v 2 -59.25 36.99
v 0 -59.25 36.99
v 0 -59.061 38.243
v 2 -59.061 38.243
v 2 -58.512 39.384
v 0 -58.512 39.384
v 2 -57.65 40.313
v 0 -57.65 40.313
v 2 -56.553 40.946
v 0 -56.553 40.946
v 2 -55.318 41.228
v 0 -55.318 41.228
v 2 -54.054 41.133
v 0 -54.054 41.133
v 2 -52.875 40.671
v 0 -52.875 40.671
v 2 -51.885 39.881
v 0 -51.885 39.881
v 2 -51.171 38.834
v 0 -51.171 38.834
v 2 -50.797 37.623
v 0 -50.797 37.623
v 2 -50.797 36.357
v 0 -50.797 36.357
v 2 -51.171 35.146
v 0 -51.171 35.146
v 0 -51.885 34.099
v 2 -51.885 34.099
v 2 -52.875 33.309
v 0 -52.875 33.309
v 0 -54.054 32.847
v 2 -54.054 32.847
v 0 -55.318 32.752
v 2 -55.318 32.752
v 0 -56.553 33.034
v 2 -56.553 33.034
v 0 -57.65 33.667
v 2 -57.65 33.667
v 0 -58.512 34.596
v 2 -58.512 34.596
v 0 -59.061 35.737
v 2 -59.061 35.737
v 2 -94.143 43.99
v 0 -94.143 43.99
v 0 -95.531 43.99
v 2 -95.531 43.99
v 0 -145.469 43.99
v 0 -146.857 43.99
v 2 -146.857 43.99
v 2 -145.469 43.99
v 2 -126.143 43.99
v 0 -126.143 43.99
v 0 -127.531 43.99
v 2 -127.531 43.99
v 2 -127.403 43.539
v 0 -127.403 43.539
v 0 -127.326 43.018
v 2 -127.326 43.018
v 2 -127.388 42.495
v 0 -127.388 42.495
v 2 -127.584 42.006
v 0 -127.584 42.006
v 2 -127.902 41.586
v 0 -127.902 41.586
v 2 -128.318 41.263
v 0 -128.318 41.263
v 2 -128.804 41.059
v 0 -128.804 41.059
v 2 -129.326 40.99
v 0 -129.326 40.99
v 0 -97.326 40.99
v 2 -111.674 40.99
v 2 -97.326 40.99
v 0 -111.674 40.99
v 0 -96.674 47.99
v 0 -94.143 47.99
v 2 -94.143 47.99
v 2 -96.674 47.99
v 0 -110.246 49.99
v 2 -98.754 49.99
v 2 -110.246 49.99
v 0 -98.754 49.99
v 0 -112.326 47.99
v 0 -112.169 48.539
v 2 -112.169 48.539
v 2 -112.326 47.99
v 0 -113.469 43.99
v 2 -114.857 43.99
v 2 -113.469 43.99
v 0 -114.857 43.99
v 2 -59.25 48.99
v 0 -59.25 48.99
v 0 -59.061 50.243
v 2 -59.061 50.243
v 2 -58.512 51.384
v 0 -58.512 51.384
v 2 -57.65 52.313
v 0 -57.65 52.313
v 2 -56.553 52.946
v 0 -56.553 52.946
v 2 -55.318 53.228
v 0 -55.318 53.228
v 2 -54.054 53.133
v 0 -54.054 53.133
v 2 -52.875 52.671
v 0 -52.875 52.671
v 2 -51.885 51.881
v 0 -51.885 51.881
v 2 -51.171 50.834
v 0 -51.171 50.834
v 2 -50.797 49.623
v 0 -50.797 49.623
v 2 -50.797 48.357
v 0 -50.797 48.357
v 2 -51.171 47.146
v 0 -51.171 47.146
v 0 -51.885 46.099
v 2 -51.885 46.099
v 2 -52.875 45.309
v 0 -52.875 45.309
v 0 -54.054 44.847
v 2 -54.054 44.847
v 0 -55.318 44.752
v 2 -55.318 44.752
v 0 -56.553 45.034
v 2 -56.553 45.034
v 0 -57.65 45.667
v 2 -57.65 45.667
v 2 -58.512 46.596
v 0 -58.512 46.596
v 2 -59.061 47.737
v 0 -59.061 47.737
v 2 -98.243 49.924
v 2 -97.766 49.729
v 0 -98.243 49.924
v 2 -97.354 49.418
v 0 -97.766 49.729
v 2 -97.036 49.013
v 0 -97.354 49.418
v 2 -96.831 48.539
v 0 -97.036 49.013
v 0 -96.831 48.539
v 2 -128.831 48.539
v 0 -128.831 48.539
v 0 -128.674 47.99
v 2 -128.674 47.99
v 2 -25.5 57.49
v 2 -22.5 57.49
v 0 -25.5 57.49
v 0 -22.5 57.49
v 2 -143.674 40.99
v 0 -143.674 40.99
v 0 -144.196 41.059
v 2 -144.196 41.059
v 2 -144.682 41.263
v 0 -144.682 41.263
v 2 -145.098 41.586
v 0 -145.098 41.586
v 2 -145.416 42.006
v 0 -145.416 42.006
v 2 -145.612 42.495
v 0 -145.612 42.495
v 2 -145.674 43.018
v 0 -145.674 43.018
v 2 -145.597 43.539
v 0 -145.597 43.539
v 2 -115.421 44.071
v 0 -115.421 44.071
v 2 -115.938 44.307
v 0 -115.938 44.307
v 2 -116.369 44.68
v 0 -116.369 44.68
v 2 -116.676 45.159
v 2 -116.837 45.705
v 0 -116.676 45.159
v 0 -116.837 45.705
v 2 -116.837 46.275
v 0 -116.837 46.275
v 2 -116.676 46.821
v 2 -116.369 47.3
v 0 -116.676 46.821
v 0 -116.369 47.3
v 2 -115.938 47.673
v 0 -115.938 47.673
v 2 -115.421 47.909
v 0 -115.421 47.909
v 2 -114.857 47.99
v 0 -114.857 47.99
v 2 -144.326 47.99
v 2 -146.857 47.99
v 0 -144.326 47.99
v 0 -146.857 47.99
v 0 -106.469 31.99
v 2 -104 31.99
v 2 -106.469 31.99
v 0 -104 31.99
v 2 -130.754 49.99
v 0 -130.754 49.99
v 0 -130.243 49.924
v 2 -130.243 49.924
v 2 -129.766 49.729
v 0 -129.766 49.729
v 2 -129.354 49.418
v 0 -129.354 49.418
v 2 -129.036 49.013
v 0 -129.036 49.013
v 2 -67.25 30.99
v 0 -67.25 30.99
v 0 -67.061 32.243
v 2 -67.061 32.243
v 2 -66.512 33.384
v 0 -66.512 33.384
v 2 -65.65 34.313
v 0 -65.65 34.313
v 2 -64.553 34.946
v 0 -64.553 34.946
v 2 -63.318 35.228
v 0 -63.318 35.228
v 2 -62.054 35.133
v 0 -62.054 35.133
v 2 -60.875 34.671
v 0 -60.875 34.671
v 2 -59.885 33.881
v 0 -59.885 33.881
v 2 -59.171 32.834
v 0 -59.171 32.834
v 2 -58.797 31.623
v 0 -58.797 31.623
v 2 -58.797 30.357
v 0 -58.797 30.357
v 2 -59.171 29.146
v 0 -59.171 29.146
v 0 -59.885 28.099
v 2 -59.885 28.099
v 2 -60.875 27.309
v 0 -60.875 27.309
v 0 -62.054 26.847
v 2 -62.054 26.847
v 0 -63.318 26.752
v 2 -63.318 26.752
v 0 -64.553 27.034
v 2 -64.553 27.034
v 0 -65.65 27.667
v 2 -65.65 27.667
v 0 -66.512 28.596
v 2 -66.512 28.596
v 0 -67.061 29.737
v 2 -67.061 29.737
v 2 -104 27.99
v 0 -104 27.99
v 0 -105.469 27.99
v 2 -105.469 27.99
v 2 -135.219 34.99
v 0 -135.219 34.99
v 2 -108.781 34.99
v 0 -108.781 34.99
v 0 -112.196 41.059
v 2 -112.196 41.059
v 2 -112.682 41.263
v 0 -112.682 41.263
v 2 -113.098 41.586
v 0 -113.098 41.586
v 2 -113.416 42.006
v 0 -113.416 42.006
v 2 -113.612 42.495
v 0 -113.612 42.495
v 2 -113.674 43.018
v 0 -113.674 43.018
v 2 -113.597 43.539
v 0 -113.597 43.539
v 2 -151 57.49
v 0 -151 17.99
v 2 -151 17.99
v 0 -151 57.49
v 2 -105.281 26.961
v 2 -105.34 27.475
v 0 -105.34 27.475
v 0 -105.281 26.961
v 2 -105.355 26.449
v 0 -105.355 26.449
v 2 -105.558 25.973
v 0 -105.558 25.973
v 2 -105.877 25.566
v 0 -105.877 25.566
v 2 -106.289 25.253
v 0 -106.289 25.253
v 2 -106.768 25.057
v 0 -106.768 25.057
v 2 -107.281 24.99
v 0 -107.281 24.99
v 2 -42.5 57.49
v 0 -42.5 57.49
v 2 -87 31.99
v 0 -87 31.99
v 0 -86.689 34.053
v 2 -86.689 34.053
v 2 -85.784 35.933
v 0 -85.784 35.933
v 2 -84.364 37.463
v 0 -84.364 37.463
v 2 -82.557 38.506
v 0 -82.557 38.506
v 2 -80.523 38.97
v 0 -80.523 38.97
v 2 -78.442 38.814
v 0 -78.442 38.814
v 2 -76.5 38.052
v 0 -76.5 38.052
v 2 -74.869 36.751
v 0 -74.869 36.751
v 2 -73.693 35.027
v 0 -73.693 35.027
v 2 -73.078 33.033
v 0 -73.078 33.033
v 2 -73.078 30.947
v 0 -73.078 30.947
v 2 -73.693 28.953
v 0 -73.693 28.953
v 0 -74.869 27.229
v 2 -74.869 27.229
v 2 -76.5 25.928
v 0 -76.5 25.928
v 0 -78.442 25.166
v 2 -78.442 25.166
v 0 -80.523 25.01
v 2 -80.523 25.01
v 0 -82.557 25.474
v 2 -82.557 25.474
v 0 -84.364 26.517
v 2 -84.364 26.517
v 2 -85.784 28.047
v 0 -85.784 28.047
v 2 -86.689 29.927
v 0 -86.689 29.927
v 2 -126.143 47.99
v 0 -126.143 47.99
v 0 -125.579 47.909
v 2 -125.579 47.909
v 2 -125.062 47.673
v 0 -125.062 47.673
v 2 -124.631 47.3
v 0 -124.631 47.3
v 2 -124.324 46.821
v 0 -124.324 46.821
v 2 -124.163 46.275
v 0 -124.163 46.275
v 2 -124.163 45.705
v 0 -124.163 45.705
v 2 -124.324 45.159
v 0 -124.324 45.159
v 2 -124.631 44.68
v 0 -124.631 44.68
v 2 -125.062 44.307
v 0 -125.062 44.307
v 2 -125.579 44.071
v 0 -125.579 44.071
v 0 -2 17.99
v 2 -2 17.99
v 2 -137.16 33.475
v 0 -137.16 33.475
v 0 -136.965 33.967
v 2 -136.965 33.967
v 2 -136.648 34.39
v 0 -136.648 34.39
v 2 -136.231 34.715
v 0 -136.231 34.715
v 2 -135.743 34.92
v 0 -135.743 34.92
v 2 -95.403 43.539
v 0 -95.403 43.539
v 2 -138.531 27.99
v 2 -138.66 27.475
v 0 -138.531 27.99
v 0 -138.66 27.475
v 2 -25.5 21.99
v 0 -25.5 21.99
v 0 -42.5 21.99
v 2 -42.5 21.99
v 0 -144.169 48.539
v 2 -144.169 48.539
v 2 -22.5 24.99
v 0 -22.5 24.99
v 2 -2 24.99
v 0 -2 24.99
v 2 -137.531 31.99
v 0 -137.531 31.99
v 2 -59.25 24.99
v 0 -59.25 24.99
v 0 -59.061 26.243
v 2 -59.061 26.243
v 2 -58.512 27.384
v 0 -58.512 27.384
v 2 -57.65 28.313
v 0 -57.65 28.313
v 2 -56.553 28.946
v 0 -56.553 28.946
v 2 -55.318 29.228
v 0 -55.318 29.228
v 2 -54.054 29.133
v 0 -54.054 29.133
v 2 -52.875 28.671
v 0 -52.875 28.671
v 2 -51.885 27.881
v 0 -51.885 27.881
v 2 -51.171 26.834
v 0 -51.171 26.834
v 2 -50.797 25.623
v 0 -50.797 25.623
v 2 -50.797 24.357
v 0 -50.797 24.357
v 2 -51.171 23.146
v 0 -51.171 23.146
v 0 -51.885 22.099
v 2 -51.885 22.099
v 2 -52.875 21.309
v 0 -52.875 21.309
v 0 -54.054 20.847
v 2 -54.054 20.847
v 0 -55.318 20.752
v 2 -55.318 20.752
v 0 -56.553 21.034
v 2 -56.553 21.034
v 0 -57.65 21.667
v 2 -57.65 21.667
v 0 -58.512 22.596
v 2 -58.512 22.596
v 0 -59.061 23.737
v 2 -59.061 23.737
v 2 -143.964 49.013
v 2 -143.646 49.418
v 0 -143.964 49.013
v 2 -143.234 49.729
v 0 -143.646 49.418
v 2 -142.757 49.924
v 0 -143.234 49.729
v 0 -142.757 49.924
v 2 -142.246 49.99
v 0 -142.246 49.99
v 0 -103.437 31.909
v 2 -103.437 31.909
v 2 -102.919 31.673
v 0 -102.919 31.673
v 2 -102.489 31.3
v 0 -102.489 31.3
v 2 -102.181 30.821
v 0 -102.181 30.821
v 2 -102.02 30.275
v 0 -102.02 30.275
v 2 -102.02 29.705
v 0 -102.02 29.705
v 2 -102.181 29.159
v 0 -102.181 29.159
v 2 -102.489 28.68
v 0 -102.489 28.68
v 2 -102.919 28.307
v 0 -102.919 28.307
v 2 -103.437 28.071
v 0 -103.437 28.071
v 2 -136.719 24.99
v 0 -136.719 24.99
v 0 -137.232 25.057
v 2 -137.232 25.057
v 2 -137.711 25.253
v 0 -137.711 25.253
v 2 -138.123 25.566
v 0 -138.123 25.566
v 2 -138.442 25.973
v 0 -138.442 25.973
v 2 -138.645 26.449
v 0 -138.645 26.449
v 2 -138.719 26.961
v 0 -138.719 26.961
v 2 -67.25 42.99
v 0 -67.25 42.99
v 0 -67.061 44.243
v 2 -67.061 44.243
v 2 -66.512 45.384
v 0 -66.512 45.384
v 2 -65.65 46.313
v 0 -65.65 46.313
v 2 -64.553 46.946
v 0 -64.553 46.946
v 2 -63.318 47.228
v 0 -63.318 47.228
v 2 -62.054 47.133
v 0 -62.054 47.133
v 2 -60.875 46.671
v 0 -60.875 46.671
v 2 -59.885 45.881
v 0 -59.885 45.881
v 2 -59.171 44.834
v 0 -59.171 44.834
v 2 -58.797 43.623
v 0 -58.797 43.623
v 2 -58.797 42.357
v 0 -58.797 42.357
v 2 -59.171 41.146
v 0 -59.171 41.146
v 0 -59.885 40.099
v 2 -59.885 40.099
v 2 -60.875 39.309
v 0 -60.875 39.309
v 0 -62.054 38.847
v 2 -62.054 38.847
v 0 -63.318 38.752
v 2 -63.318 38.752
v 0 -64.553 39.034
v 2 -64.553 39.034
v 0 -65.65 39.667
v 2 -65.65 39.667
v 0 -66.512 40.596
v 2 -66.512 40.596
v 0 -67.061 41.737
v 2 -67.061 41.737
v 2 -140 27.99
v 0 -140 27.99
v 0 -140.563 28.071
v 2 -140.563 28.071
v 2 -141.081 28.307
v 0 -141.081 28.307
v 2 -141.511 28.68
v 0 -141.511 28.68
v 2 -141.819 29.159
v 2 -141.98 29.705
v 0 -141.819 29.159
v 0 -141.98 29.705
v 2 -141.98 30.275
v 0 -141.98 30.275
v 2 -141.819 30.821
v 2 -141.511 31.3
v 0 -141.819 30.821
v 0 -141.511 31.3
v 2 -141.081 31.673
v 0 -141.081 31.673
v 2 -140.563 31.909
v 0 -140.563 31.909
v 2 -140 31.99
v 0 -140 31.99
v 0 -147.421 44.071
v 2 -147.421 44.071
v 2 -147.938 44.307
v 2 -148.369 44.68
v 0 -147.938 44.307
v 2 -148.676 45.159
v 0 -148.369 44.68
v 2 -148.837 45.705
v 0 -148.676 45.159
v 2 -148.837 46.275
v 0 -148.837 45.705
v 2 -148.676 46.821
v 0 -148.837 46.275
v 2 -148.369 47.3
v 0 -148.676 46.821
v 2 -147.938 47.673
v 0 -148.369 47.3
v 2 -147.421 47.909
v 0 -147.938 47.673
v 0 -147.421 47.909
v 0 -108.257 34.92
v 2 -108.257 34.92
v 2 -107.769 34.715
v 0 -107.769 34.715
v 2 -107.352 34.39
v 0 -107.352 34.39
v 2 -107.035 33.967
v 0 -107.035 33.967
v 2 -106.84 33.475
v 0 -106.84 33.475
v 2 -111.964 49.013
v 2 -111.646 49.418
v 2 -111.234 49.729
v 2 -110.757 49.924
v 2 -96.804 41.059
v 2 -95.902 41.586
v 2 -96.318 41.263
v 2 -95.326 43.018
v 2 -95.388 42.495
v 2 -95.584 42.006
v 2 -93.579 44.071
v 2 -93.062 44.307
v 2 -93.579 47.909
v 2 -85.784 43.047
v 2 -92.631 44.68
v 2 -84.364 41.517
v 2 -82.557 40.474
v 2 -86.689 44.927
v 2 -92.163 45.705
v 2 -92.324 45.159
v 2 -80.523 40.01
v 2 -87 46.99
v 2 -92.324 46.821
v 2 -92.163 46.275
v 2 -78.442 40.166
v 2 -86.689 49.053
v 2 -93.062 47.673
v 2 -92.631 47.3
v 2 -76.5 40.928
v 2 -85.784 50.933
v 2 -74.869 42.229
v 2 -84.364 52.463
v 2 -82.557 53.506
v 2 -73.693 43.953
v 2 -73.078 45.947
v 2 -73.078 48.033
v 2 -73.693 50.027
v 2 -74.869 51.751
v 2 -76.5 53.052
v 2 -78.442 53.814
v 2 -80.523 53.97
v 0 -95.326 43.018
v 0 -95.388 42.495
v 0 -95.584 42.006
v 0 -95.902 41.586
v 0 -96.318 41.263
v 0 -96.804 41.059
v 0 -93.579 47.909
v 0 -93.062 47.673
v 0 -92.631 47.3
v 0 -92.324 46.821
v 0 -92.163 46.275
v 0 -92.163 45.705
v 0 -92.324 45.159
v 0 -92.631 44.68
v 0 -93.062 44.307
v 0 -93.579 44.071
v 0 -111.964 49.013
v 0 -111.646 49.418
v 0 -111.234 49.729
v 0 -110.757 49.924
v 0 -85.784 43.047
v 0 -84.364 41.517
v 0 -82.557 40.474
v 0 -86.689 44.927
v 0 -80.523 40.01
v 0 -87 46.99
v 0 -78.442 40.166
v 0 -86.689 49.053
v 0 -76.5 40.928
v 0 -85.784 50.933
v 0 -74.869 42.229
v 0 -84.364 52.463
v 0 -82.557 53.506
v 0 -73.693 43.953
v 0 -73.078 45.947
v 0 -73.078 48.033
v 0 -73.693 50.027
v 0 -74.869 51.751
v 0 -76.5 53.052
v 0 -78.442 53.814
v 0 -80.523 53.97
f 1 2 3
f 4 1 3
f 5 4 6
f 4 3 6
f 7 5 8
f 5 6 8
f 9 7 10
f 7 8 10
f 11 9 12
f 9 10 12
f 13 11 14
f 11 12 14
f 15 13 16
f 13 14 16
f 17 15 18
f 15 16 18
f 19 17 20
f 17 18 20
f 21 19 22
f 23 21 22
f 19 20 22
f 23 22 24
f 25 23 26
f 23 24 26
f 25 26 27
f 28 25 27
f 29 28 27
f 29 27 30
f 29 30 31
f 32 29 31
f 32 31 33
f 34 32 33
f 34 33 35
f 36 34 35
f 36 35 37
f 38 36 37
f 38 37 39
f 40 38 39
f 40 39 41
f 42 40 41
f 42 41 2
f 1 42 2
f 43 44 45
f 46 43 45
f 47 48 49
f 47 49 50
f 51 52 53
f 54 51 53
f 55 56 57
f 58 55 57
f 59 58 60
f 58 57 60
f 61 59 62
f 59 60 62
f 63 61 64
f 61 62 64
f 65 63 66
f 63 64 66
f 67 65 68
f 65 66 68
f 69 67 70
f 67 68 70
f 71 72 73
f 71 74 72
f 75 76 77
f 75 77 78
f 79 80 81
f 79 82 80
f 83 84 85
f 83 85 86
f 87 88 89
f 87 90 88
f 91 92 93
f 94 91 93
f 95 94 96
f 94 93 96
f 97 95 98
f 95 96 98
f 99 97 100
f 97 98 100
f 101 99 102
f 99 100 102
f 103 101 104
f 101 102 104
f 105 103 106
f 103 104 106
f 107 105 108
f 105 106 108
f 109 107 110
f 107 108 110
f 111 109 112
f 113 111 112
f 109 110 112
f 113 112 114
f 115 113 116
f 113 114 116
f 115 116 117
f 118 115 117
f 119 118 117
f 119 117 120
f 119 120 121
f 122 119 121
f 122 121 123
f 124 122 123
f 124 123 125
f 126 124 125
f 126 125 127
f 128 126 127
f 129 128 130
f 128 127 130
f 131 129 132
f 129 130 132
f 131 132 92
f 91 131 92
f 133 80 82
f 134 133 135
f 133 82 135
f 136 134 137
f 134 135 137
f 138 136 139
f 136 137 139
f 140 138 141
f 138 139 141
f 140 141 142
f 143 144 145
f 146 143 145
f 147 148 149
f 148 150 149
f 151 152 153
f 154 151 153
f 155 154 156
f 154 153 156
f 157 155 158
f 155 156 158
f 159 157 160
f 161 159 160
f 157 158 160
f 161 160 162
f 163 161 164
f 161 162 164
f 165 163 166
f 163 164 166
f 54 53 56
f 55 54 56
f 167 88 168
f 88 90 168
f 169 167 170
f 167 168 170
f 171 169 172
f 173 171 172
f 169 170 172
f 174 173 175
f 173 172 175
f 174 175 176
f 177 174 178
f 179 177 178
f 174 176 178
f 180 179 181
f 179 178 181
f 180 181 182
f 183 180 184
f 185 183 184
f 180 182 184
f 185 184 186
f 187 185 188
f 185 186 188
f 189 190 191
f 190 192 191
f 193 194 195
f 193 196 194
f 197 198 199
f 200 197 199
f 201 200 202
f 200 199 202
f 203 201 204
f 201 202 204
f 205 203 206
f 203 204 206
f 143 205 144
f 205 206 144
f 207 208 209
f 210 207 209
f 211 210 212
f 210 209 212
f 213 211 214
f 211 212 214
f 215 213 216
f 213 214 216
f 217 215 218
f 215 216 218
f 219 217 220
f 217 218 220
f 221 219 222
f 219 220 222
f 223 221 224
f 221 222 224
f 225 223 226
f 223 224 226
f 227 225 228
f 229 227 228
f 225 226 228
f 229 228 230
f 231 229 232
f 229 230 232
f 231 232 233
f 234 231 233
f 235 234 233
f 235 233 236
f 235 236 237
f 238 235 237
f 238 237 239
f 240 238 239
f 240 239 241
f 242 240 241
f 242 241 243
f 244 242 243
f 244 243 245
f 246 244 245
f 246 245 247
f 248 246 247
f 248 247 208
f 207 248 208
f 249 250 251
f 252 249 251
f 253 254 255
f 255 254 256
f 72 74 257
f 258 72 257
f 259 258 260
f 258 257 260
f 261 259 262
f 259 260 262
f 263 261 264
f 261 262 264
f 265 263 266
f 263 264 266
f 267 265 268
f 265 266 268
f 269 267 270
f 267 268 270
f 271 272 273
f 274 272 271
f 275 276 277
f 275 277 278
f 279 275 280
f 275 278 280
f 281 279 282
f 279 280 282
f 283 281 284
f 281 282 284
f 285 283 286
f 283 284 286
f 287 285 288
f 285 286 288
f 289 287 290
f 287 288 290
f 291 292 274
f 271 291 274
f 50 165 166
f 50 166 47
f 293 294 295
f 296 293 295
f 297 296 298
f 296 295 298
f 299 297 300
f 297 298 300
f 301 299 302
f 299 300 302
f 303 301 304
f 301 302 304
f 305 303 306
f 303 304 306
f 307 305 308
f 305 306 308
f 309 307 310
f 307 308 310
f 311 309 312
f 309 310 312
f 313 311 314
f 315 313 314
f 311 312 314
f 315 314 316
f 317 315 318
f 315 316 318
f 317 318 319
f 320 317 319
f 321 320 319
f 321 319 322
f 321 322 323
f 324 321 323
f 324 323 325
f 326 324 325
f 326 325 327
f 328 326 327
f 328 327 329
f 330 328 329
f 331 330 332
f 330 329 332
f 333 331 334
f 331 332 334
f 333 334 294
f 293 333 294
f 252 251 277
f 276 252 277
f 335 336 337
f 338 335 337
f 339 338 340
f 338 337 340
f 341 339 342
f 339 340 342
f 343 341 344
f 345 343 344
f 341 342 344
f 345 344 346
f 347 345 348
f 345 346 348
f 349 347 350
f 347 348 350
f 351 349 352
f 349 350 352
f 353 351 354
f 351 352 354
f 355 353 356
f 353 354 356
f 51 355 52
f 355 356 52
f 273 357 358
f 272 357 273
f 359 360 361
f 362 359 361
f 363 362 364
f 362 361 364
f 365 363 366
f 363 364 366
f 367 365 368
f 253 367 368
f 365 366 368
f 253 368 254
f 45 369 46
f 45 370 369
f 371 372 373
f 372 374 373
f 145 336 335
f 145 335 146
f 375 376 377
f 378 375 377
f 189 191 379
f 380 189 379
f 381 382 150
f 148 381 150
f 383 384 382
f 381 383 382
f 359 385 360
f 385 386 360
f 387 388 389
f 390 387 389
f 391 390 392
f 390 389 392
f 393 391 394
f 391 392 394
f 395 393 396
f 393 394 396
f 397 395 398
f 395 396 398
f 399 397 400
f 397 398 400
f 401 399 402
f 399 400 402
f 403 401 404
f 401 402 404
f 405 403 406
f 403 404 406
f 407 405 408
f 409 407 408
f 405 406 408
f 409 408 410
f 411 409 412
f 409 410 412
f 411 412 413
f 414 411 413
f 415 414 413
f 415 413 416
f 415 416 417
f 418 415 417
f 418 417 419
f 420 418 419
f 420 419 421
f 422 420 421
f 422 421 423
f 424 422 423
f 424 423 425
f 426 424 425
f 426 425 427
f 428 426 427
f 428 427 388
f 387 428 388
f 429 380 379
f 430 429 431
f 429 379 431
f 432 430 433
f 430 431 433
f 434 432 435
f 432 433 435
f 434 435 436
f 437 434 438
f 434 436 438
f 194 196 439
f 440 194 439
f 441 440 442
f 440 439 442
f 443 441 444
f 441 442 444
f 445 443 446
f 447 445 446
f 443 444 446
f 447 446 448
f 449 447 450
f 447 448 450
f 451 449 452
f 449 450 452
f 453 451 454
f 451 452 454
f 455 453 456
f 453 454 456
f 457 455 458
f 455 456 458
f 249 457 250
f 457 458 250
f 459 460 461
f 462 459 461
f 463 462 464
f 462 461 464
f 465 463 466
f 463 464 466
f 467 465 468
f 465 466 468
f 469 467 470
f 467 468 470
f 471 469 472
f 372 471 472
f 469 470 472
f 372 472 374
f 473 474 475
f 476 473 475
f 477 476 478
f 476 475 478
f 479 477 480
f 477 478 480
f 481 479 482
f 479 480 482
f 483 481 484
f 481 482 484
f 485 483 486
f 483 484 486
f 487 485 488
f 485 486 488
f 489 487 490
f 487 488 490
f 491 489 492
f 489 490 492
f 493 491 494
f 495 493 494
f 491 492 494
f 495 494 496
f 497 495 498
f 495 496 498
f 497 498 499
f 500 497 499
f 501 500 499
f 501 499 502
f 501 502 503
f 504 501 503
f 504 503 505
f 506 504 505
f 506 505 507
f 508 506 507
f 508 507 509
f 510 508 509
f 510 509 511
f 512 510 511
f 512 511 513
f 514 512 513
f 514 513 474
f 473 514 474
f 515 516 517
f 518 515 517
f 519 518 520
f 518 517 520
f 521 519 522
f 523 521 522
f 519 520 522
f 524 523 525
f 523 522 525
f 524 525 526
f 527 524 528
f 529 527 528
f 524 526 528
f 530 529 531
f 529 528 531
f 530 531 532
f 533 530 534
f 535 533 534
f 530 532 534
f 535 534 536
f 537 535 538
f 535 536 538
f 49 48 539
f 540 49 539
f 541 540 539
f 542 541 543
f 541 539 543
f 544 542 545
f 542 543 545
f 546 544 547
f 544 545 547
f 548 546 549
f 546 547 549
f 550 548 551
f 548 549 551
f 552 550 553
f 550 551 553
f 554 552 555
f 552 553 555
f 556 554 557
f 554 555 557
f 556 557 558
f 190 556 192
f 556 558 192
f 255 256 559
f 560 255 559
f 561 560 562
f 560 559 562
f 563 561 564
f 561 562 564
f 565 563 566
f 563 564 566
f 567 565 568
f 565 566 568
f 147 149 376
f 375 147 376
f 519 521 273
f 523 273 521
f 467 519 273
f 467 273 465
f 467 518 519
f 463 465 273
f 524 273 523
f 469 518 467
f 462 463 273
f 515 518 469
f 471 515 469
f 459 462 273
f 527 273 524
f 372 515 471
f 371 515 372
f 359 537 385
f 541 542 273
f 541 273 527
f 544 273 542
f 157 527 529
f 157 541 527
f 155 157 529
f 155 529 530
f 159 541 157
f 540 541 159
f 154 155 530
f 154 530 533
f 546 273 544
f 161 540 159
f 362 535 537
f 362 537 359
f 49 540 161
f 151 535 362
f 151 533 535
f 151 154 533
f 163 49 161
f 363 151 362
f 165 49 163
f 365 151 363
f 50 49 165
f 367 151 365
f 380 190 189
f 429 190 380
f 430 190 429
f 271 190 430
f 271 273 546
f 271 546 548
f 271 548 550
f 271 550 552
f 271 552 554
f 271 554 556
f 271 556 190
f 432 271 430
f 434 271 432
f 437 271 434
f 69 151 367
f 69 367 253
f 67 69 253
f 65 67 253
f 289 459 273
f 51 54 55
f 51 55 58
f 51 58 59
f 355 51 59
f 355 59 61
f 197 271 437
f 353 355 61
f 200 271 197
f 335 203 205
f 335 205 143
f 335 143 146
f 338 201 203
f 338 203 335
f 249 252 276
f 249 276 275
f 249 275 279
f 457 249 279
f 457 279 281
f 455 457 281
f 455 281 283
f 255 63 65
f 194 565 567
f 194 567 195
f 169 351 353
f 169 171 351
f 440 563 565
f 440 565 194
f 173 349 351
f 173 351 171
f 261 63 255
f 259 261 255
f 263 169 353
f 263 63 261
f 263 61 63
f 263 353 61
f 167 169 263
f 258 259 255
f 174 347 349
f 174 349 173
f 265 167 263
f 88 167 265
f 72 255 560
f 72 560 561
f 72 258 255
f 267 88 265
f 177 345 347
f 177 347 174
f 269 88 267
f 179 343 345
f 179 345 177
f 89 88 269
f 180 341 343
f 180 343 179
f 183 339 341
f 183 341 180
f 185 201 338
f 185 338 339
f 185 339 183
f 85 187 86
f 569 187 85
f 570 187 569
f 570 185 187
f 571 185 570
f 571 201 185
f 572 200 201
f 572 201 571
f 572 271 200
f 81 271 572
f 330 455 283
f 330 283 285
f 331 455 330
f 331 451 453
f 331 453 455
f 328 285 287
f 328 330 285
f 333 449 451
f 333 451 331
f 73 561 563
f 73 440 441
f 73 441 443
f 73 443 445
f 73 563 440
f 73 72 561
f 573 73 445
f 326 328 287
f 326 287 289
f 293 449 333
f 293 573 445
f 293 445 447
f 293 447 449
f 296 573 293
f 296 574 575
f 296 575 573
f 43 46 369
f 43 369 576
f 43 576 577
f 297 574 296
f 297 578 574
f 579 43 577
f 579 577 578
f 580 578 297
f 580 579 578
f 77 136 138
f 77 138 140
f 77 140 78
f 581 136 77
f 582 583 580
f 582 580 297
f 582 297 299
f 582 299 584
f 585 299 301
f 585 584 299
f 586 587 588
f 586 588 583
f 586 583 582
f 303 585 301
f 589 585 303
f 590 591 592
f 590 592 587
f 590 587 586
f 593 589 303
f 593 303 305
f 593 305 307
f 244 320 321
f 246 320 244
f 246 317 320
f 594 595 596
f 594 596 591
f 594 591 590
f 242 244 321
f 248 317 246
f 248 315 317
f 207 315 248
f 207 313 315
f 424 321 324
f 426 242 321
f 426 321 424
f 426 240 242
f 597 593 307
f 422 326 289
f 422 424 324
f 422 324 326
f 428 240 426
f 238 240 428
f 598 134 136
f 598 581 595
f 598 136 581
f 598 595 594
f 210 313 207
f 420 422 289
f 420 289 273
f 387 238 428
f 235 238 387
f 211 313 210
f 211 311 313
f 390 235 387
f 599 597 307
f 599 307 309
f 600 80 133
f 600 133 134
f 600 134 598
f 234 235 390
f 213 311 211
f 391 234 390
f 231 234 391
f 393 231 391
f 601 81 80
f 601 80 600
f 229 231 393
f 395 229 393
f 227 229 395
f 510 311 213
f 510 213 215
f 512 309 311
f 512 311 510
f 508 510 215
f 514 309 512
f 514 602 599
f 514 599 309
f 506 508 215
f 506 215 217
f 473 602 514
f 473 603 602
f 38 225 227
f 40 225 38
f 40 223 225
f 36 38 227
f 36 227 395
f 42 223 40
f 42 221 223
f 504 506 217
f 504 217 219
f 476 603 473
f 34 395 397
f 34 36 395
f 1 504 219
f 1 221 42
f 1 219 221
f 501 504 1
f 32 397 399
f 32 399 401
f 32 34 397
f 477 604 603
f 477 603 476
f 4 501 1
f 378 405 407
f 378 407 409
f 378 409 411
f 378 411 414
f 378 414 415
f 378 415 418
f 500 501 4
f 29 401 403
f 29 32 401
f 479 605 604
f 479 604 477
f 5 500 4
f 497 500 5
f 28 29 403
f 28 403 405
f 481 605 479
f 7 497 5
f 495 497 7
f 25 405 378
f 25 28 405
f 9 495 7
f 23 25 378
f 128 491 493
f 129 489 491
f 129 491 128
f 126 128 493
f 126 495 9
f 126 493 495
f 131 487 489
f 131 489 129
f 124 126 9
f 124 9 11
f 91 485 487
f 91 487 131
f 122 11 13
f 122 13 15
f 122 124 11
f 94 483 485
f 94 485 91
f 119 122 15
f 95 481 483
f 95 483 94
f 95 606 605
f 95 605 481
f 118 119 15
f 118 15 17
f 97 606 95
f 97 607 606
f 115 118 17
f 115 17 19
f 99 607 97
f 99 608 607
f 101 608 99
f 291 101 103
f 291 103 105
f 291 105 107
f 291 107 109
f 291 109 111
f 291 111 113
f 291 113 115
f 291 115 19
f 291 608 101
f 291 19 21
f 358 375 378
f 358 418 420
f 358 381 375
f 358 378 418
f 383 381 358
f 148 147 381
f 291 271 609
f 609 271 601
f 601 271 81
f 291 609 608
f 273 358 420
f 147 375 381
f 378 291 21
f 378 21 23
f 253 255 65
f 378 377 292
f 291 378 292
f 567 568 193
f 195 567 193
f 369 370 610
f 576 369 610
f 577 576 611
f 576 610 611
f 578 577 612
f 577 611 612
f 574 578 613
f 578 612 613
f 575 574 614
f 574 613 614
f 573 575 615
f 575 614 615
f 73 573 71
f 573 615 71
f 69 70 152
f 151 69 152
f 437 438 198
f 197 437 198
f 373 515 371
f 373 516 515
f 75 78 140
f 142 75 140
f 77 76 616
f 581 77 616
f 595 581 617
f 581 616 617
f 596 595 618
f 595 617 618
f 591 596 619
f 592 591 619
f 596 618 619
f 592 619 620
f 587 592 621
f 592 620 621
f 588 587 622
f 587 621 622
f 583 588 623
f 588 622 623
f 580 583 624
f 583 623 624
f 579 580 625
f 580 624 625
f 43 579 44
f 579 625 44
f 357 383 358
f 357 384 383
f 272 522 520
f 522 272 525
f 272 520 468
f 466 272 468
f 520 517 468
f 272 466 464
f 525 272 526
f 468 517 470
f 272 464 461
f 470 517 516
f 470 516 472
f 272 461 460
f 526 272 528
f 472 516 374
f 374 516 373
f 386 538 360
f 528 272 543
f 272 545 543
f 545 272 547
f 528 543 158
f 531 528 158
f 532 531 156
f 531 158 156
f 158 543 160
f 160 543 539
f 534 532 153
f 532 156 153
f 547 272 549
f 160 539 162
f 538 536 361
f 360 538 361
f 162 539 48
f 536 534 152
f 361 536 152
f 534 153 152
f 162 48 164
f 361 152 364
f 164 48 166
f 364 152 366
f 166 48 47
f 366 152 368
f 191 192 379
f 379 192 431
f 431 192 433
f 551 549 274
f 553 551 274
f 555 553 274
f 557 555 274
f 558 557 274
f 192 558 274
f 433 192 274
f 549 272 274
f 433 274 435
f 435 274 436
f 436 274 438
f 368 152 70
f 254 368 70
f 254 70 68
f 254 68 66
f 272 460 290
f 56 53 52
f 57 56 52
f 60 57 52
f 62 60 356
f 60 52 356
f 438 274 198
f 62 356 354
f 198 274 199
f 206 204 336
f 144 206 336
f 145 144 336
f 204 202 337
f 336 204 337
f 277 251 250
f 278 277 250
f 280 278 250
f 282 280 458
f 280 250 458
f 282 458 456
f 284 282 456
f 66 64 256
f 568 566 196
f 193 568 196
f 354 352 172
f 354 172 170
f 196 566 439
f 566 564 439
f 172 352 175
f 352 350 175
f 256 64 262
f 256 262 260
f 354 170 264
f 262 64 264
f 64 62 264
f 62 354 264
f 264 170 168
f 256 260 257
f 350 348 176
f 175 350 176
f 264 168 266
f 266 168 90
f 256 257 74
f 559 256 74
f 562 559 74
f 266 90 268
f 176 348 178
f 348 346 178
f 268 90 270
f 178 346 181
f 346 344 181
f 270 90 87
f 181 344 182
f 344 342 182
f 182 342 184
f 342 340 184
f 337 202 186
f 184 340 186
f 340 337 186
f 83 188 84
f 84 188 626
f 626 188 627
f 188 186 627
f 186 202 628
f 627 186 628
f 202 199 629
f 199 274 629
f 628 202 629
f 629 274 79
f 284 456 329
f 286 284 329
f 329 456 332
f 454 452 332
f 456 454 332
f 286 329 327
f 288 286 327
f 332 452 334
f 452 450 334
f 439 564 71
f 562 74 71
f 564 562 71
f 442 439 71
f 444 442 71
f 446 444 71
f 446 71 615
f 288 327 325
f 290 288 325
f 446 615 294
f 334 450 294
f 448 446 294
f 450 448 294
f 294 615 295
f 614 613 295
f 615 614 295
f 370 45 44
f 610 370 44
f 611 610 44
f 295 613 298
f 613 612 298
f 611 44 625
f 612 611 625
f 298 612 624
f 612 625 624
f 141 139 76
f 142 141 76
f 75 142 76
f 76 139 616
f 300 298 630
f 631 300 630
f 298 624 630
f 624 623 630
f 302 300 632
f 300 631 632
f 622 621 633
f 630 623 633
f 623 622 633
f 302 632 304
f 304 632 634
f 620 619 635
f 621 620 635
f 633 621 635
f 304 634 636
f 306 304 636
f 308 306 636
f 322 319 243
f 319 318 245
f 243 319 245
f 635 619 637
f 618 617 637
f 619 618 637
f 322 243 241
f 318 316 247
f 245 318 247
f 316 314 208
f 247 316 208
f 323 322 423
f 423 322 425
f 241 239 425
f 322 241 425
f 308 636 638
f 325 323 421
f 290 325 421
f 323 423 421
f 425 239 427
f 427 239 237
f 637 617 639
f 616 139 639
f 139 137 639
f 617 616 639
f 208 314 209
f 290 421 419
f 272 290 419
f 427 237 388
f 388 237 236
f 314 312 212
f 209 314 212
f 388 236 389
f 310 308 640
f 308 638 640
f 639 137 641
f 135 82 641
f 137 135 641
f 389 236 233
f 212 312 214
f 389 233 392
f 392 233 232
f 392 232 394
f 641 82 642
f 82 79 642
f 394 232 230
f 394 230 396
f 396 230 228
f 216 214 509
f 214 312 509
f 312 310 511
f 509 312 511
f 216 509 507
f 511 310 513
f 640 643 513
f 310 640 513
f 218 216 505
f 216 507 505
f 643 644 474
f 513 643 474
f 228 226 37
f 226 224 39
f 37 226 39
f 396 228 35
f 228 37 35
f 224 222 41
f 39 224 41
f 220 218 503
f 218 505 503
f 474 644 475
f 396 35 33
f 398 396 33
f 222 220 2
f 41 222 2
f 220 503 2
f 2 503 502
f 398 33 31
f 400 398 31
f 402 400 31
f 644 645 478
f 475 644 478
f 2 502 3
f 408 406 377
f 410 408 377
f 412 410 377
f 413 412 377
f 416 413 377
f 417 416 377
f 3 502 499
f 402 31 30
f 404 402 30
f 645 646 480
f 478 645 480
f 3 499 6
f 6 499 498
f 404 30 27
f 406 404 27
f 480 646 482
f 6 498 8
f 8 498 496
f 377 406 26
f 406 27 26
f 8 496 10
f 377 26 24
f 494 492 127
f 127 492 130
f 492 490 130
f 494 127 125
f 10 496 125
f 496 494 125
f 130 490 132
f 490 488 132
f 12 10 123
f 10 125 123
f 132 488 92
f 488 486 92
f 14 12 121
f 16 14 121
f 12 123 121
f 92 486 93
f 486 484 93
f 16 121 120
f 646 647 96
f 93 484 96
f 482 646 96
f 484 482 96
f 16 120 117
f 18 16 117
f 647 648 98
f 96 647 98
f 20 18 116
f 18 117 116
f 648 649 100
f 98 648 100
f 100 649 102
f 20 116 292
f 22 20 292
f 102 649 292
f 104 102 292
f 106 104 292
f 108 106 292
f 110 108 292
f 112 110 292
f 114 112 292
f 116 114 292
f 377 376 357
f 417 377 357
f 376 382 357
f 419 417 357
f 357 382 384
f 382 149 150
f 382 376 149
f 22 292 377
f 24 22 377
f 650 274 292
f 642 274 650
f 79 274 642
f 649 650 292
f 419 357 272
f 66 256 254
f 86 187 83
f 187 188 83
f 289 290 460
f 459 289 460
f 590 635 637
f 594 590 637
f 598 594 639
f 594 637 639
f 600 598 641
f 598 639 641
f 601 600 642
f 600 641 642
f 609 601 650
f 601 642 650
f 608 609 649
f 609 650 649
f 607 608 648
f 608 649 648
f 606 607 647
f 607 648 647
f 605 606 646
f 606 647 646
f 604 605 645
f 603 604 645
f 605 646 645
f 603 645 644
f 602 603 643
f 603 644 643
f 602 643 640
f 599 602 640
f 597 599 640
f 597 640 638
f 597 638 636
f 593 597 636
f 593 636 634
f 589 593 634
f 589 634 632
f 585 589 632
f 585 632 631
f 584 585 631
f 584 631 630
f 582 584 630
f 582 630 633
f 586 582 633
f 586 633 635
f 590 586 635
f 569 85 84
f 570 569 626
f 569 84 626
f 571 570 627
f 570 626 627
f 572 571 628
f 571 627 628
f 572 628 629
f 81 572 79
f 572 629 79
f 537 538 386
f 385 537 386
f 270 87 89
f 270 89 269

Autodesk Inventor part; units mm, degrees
ref_plane "YZ Plane" through (0, 0, 0) normal (1, 0, 0) x (0, 1, 0)
ref_plane "XZ Plane" through (0, 0, 0) normal (0, 1, 0) x (-1, 0, 0)
ref_plane "XY Plane" through (0, 0, 0) normal (0, 0, 1) x (1, 0, 0)
sketch "Sketch2" plane through (0, 0, 0) normal (1, 0, 0) x (0, 1, 0)
  line L0 (-2.5, 55.99) -> (-2.5, 18.99)
  line L1 (-2.5, 18.99) -> (-150.5, 18.99)
  line L2 (-150.5, 18.99) -> (-150.5, 55.99)
  line L3 (-150.5, 55.99) -> (-2.5, 55.99)
  line L4 (87, 57.49) -> (-160.5, 57.49)
  line L5 (-151, 57.49) -> (-2, 57.49)
  line L6 (-2, 57.49) -> (-2, 17.99)
  line L7 (-2, 17.99) -> (-151, 17.99)
  line L8 (-151, 17.99) -> (-151, 57.49)
  dimension "d1" = 1.5
  dimension "d2" = 0.5
  dimension "d3" = 0.5
  dimension "d4" = 1
extrude "Extrusion1" add sketch "Sketch2" along normal blind 2 contours L0 L1 L2 L3 | L6 L7 L8 L4
sketch "Sketch3" plane through (0, 0, 0) normal (-1, 0, 0) x (0, -1, 0)
  arc A0 (111.6743, 41.99) -> (112.6358, 43.2647) centre (111.6743, 42.99) ccw
  line L0 (111.2072, 48.2647) -> (112.6358, 43.2647)
  arc A1 (111.2072, 48.2647) -> (110.2457, 48.99) centre (110.2457, 47.99) ccw
  line L1 (98.7543, 48.99) -> (110.2457, 48.99)
  arc A2 (98.7543, 48.99) -> (97.7928, 48.2647) centre (98.7543, 47.99) ccw
  line L2 (96.3642, 43.2647) -> (97.7928, 48.2647)
  arc A3 (96.3642, 43.2647) -> (97.3257, 41.99) centre (97.3257, 42.99) ccw
  line L3 (111.6743, 41.99) -> (97.3257, 41.99)
  circle A4 centre (114.8571, 45.99) radius 0.7915
  circle A5 centre (94.1429, 45.99) radius 0.7915
  line L4 (143.6743, 41.99) -> (129.3257, 41.99)
  arc A6 (128.3642, 43.2647) -> (129.3257, 41.99) centre (129.3257, 42.99) ccw
  line L5 (128.3642, 43.2647) -> (129.7928, 48.2647)
  arc A7 (130.7543, 48.99) -> (129.7928, 48.2647) centre (130.7543, 47.99) ccw
  line L6 (130.7543, 48.99) -> (142.2457, 48.99)
  arc A8 (143.2072, 48.2647) -> (142.2457, 48.99) centre (142.2457, 47.99) ccw
  line L7 (143.2072, 48.2647) -> (144.6358, 43.2647)
  arc A9 (143.6743, 41.99) -> (144.6358, 43.2647) centre (143.6743, 42.99) ccw
  circle A10 centre (146.8571, 45.99) radius 0.7915
  circle A11 centre (126.1429, 45.99) radius 0.7915
  line L8 (108.7808, 33.99) -> (135.2192, 33.99)
  arc A12 (108.7808, 33.99) -> (107.8106, 33.2325) centre (108.7808, 32.99) ccw
  line L9 (106.3106, 27.2325) -> (107.8106, 33.2325)
  arc A13 (106.3106, 27.2325) -> (107.2808, 25.99) centre (107.2808, 26.99) ccw
  line L10 (136.7192, 25.99) -> (107.2808, 25.99)
  arc A14 (136.7192, 25.99) -> (137.6894, 27.2325) centre (136.7192, 26.99) ccw
  line L11 (136.1894, 33.2325) -> (137.6894, 27.2325)
  arc A15 (136.1894, 33.2325) -> (135.2192, 33.99) centre (135.2192, 32.99) ccw
  circle A16 centre (140, 29.99) radius 0.7915
  circle A17 centre (104, 29.99) radius 0.7915
  arc A18 (95.4027, 43.5394) -> (97.3257, 40.99) centre (97.3257, 42.99) ccw
  line L12 (95.4027, 43.5394) -> (96.8313, 48.5394)
  arc A19 (98.7543, 49.99) -> (96.8313, 48.5394) centre (98.7543, 47.99) ccw
  line L13 (98.7543, 49.99) -> (110.2457, 49.99)
  arc A20 (112.1687, 48.5394) -> (110.2457, 49.99) centre (110.2457, 47.99) ccw
  line L14 (112.1687, 48.5394) -> (113.5973, 43.5394)
  arc A21 (111.6743, 40.99) -> (113.5973, 43.5394) centre (111.6743, 42.99) ccw
  line L15 (111.6743, 40.99) -> (97.3257, 40.99)
  circle A22 centre (94.1429, 45.99) radius 2
  line L16 (94.1429, 47.99) -> (96.6743, 47.99)
  line L17 (94.1429, 43.99) -> (95.5314, 43.99)
  circle A23 centre (114.8571, 45.99) radius 2
  line L18 (114.8571, 47.99) -> (112.3257, 47.99)
  line L19 (114.8571, 43.99) -> (113.4686, 43.99)
  circle A24 centre (126.1429, 45.99) radius 2
  circle A25 centre (146.8571, 45.99) radius 2
  circle A26 centre (140, 29.99) radius 2
  circle A27 centre (104, 29.99) radius 2
  line L20 (142.2457, 49.99) -> (130.7543, 49.99)
  arc A28 (130.7543, 49.99) -> (128.8313, 48.5394) centre (130.7543, 47.99) ccw
  line L21 (128.8313, 48.5394) -> (127.4027, 43.5394)
  arc A29 (127.4027, 43.5394) -> (129.3257, 40.99) centre (129.3257, 42.99) ccw
  line L22 (129.3257, 40.99) -> (143.6743, 40.99)
  arc A30 (143.6743, 40.99) -> (145.5973, 43.5394) centre (143.6743, 42.99) ccw
  line L23 (145.5973, 43.5394) -> (144.1687, 48.5394)
  arc A31 (144.1687, 48.5394) -> (142.2457, 49.99) centre (142.2457, 47.99) ccw
  line L24 (126.1429, 47.99) -> (128.6743, 47.99)
  line L25 (126.1429, 43.99) -> (127.5314, 43.99)
  line L26 (146.8571, 47.99) -> (144.3257, 47.99)
  line L27 (146.8571, 43.99) -> (145.4686, 43.99)
  line L28 (135.2192, 34.99) -> (108.7808, 34.99)
  arc A32 (108.7808, 34.99) -> (106.8405, 33.4751) centre (108.7808, 32.99) ccw
  line L29 (106.8405, 33.4751) -> (105.3405, 27.4751)
  arc A33 (105.3405, 27.4751) -> (107.2808, 24.99) centre (107.2808, 26.99) ccw
  line L30 (107.2808, 24.99) -> (136.7192, 24.99)
  arc A34 (136.7192, 24.99) -> (138.6595, 27.4751) centre (136.7192, 26.99) ccw
  line L31 (138.6595, 27.4751) -> (137.1595, 33.4751)
  arc A35 (137.1595, 33.4751) -> (135.2192, 34.99) centre (135.2192, 32.99) ccw
  line L32 (104, 31.99) -> (106.4692, 31.99)
  line L33 (104, 27.99) -> (105.4692, 27.99)
  line L34 (140, 31.99) -> (137.5308, 31.99)
  line L35 (140, 27.99) -> (138.5308, 27.99)
  dimension "d7" = 1
  dimension "d8" = 4
  dimension "d9" = 1
  dimension "d10" = 1
extrude "Extrusion2" cut sketch "Sketch3" against normal through all contours L3 A3 L2 A2 L1 A1 L0 A0 | A4 | A5 | L4 A6 L5 A7 L6 A8 L7 A9 | A10 | A11 | L8 A15 L11 A14 L10 A13 L9 A12 | A16 | A17 | L12 A22 A19 L13 A20 L14 A23 A21 L15 A18 | L17 A22 L12 | A22 L12 | L12 A22 | A22 L16 L12 | L14 A23 L19 | A23 L14 | L14 A23 | L14 L18 A23 | A24 L21 | L24 L21 A24 | A24 L21 L25 | L21 A28 L20 A31 L23 A25 A30 L22 A29 A24 | A24 L21 | L26 A25 L23 | L23 A25 L27 | L23 A25 | A25 L23 | A26 L31 | A26 L31 L34 | L35 L31 A26 | L31 A26 | A26 L31 A34 L30 A33 L29 A27 A32 L28 A35 | L29 A27 L32 | L33 A27 L29 | L29 A27 | A27 L29
sketch "Sketch4" plane through (0, 0, 0) normal (-1, 0, 0) x (0, -1, 0)
  circle A0 centre (55, 48.99) radius 3.5
  circle A1 centre (63, 42.99) radius 3.5
  circle A2 centre (55, 36.99) radius 3.5
  circle A3 centre (63, 30.99) radius 3.5
  circle A4 centre (55, 24.99) radius 3.5
  circle A5 centre (80, 46.99) radius 6
  circle A6 centre (80, 31.99) radius 6
  circle A7 centre (55, 48.99) radius 4.25
  circle A8 centre (63, 42.99) radius 4.25
  circle A9 centre (55, 36.99) radius 4.25
  circle A10 centre (55, 24.99) radius 4.25
  circle A11 centre (63, 30.99) radius 4.25
  circle A12 centre (80, 31.99) radius 7
  circle A13 centre (80, 46.99) radius 7
  dimension "d13" = 8.5
  dimension "d14" = 14
extrude "Extrusion3" cut sketch "Sketch4" against normal through all contours A0 | A1 | A2 | A3 | A4 | A5 | A6 | A7 | A8 | A9 | A10 | A11 | A12 | A13
sketch "Sketch5" plane through (0, 0, 0) normal (-1, 0, 0) x (0, -1, 0)
  line L0 (2, 57.49) -> (151, 57.49) projected
  line L1 (2, 17.99) -> (2, 57.49) projected
  line L2 (2, 24.99) -> (22.5, 24.99)
  line L3 (22.5, 24.99) -> (22.5, 57.49)
  line L4 (22.5, 57.49) -> (2, 57.49)
  line L5 (2, 57.49) -> (2, 24.99)
  line L6 (25.5, 21.99) -> (42.5, 21.99)
  line L7 (42.5, 21.99) -> (42.5, 57.49)
  line L8 (42.5, 57.49) -> (25.5, 57.49)
  line L9 (25.5, 57.49) -> (25.5, 21.99)
  line L10 (151, 17.99) -> (2, 17.99) projected
  dimension "d24" = 4
  dimension "d25" = 7
  dimension "d26" = 20.5
  dimension "d27" = 3
  dimension "d28" = 17
extrude "Extrusion4" cut sketch "Sketch5" against normal through all
equation "\"d9\" = d7"
equation "\"d10\" = d7"
properties part number "config - casing - module protector"
